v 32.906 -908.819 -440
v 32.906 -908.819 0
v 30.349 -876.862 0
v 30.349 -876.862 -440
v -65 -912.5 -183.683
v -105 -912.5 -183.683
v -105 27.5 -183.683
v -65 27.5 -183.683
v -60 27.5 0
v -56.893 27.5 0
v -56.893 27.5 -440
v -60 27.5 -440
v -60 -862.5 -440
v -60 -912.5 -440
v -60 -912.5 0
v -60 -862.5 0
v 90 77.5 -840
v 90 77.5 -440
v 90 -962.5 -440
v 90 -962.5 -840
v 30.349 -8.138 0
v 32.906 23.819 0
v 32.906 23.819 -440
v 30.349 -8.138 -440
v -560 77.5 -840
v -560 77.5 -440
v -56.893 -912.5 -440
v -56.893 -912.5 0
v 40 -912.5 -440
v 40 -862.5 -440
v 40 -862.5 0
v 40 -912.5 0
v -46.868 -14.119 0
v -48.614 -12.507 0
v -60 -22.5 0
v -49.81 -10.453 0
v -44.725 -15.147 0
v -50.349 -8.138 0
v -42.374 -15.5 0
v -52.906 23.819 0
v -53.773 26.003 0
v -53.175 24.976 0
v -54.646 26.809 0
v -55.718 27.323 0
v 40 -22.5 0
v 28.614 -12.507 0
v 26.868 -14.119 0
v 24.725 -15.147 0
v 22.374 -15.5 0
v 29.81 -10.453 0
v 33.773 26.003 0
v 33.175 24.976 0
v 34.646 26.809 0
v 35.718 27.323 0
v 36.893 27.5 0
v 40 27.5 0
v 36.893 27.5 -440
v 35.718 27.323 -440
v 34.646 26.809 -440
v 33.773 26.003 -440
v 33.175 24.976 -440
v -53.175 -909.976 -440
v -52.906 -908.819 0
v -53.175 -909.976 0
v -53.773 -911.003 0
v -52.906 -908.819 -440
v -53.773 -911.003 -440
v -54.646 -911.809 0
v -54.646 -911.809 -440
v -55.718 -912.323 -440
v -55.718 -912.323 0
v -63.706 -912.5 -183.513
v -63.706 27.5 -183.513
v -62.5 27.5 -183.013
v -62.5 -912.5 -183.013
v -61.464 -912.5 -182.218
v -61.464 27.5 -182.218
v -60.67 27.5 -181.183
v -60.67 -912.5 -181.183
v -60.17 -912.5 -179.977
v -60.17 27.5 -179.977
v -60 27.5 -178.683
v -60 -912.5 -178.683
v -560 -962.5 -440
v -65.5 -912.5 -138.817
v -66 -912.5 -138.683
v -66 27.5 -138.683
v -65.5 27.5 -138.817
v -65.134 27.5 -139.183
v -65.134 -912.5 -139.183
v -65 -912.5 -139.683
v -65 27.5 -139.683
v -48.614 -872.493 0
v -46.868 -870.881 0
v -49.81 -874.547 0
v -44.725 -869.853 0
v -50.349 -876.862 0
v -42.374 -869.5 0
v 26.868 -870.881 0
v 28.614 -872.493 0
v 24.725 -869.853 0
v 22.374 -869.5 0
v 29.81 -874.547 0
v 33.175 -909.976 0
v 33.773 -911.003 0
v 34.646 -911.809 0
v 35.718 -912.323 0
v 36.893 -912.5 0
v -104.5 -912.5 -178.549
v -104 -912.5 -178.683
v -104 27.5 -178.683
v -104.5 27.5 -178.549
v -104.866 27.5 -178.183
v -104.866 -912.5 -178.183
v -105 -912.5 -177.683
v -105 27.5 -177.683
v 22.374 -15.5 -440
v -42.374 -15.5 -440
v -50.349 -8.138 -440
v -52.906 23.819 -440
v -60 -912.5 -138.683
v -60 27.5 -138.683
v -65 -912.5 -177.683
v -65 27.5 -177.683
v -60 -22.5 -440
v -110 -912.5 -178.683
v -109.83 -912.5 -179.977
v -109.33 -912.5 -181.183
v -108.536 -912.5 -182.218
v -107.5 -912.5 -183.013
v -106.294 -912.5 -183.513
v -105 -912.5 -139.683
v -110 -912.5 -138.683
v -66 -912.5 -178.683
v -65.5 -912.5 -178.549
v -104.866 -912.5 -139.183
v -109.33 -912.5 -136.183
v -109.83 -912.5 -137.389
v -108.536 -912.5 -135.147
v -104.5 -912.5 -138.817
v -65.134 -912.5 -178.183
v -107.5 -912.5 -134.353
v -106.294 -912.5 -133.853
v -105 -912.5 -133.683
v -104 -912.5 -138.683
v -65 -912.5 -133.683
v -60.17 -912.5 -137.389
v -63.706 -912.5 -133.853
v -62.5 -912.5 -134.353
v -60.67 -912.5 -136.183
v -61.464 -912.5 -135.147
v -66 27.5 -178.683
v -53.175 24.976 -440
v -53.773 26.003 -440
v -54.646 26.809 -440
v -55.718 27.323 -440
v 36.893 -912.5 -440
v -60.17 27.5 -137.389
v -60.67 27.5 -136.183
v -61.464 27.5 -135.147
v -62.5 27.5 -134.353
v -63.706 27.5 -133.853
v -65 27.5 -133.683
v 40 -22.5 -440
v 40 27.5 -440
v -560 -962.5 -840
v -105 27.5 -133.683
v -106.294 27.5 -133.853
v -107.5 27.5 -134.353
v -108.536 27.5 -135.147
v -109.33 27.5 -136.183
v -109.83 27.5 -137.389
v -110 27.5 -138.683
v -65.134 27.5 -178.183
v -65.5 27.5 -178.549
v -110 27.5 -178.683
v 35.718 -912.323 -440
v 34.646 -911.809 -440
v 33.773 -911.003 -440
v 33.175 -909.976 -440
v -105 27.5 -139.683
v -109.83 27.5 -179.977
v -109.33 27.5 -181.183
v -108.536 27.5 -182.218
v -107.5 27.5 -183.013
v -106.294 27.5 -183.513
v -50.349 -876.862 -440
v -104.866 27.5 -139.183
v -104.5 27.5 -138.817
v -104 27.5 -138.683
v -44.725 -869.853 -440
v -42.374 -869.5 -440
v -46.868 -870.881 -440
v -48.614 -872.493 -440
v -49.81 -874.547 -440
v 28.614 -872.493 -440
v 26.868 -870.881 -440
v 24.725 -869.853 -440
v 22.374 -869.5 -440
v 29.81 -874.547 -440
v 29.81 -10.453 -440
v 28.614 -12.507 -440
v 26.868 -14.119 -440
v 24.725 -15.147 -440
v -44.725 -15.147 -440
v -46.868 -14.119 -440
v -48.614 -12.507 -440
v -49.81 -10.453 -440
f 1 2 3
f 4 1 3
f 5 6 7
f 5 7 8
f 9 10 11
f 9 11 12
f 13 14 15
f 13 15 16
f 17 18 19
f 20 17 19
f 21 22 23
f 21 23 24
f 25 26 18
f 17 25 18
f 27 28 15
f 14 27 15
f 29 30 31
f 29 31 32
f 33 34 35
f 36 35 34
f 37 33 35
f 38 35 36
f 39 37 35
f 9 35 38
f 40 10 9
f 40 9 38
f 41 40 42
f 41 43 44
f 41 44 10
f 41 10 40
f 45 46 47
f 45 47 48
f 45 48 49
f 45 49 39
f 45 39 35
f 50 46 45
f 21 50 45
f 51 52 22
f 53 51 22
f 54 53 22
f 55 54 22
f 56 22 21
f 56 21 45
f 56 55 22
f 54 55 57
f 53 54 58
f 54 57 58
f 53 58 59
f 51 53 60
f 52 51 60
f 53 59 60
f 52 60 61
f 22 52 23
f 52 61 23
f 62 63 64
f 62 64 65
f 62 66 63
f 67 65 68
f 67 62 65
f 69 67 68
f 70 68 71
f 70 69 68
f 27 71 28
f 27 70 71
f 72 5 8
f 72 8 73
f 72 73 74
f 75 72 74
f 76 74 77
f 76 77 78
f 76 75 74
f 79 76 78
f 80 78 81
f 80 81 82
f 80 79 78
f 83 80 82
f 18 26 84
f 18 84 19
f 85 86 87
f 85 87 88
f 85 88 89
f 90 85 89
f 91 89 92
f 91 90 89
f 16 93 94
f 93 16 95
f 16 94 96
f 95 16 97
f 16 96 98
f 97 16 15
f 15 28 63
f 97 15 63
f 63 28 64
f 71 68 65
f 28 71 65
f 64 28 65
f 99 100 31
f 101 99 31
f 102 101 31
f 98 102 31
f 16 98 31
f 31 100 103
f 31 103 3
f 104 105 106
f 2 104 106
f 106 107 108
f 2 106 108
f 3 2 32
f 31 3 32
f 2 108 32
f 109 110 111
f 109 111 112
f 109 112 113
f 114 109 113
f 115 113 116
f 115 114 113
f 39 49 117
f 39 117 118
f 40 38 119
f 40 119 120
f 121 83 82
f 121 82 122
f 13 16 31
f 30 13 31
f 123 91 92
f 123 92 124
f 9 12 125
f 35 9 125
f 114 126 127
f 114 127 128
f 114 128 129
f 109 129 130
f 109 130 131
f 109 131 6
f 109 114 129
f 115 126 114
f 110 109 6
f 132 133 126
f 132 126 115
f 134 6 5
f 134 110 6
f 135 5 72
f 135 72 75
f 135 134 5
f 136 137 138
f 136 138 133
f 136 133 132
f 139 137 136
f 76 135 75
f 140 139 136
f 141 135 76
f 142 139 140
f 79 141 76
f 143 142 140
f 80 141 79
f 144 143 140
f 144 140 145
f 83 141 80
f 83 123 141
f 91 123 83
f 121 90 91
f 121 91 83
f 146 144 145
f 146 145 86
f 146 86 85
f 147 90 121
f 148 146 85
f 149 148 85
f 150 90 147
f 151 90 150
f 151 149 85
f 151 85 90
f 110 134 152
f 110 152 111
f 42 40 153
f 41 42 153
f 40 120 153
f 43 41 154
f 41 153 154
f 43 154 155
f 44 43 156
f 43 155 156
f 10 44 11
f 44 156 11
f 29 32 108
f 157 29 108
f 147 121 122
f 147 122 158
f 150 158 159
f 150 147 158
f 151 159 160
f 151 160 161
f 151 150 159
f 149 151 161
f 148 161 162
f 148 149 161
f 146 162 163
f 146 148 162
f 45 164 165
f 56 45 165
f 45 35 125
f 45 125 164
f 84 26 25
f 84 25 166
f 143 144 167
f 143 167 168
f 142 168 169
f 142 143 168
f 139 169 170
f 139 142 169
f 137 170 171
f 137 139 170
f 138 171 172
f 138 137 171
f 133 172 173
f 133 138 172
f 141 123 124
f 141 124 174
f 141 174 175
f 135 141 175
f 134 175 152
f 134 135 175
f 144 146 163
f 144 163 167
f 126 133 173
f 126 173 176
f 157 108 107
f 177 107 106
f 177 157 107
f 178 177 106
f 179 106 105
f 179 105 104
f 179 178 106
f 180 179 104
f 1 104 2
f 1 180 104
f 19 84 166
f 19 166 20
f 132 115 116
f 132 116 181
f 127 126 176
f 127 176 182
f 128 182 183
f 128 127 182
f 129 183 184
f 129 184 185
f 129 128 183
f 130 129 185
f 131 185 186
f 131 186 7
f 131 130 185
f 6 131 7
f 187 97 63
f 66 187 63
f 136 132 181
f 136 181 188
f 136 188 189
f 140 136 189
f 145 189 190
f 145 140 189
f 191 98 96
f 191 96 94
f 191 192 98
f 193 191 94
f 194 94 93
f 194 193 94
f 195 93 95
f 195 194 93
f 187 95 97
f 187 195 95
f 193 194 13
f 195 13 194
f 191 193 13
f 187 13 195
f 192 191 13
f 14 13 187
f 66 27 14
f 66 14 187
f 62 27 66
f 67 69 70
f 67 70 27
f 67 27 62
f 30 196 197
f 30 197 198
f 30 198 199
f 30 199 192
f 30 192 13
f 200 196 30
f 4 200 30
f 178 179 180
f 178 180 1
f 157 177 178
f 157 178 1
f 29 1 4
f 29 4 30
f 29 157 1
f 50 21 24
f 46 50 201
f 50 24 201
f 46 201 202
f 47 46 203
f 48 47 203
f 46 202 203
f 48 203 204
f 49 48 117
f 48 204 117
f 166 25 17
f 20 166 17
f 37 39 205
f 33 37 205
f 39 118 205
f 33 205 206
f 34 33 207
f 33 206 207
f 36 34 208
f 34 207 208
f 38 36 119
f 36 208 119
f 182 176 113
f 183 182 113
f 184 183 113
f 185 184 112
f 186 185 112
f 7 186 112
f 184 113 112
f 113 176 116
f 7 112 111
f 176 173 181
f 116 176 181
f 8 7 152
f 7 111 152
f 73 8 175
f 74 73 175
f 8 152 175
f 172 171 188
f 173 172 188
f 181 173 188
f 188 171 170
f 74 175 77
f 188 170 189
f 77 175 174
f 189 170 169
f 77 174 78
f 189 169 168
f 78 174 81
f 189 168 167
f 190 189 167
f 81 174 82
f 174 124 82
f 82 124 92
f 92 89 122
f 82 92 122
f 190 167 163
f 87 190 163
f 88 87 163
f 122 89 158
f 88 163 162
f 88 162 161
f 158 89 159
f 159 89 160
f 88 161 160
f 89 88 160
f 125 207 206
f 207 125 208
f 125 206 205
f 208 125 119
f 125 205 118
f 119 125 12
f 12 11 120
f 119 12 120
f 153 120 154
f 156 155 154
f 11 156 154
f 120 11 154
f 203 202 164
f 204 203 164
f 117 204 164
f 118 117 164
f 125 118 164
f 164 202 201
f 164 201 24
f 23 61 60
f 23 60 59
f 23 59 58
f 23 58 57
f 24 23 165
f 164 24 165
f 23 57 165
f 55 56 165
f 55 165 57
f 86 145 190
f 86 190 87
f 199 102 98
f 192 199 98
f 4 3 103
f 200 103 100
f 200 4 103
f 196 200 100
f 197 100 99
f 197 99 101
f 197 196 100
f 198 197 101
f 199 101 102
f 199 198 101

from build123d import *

# Parameters (mm, degrees)
F1_DEPTH  = 440
F2_R      = 4
F3_R      = 8
F6_W      = 650
F6_H      = 1040
F7_DEPTH  = 400
F10_DEPTH = 940


with BuildPart() as f1:
    # F0 (on Top) → F1 (new body)
    with BuildSketch(Plane.XY):
        Polygon((-60, 27.5), (-60, -22.5), (40, -22.5), (40, 27.5), (33.2000380344, 27.5), (29.7599785624, -15.5), (-49.7599785624, -15.5), (-53.2000380344, 27.5), align=None)
    extrude(amount=-F1_DEPTH)

    # F2
    f2_edges = [f1.edges().sort_by_distance(p)[0] for p in [
        (-53.200038, 27.5, -220),
        (33.200038, 27.5, -220),
    ]]
    fillet(f2_edges, radius=F2_R)

    # F3
    f3_edges = [f1.edges().sort_by_distance(p)[0] for p in [
        (-49.759979, -15.5, -220),
        (29.759979, -15.5, -220),
    ]]
    fillet(f3_edges, radius=F3_R)


with BuildPart() as f5_1:
    # F5: instance of F1
    add(f1.part.mirror(Plane(origin=(-10, -442.5, -220), x_dir=(1, 0, 0), z_dir=(0, -1, 0))))


with BuildPart() as f7:
    # F6 (on face) → F7 (new body)
    with BuildSketch(Plane(origin=(0, 0, -440), x_dir=(1, 0, 0), z_dir=(0, 0, -1))):
        with Locations((-235, 442.5)):
            Rectangle(F6_W, F6_H)
    extrude(amount=F7_DEPTH)


with BuildPart() as f10:
    # F9 (on offset) → F10 (new body)
    with BuildSketch(Plane.XZ.offset(912.5)):
        with BuildLine():
            ThreePointArc((-60, -138.6828742802), (-61.4644660941, -135.1473403743), (-65, -133.6828742802))
            Line((-65, -133.6828742802), (-105, -133.6828742802))
            ThreePointArc((-105, -133.6828742802), (-108.5355339059, -135.1473403743), (-110, -138.6828742802))
            Line((-110, -138.6828742802), (-110, -178.6828742802))
            ThreePointArc((-110, -178.6828742802), (-108.5355339059, -182.2184081862), (-105, -183.6828742802))
            Line((-105, -183.6828742802), (-65, -183.6828742802))
            ThreePointArc((-65, -183.6828742802), (-61.4644660941, -182.2184081862), (-60, -178.6828742802))
            Line((-60, -178.6828742802), (-60, -138.6828742802))
        make_face()
        with BuildLine():
            ThreePointArc((-105, -139.6828742802), (-104.7071067812, -138.975767499), (-104, -138.6828742802))
            Line((-104, -138.6828742802), (-66, -138.6828742802))
            ThreePointArc((-66, -138.6828742802), (-65.2928932188, -138.975767499), (-65, -139.6828742802))
            Line((-65, -139.6828742802), (-65, -177.6828742802))
            ThreePointArc((-65, -177.6828742802), (-65.2928932188, -178.3899810614), (-66, -178.6828742802))
            Line((-66, -178.6828742802), (-104, -178.6828742802))
            ThreePointArc((-104, -178.6828742802), (-104.7071067812, -178.3899810614), (-105, -177.6828742802))
            Line((-105, -177.6828742802), (-105, -139.6828742802))
        make_face(mode=Mode.SUBTRACT)
    extrude(amount=-F10_DEPTH)


solid = Compound([f1.part, f5_1.part, f7.part, f10.part])
